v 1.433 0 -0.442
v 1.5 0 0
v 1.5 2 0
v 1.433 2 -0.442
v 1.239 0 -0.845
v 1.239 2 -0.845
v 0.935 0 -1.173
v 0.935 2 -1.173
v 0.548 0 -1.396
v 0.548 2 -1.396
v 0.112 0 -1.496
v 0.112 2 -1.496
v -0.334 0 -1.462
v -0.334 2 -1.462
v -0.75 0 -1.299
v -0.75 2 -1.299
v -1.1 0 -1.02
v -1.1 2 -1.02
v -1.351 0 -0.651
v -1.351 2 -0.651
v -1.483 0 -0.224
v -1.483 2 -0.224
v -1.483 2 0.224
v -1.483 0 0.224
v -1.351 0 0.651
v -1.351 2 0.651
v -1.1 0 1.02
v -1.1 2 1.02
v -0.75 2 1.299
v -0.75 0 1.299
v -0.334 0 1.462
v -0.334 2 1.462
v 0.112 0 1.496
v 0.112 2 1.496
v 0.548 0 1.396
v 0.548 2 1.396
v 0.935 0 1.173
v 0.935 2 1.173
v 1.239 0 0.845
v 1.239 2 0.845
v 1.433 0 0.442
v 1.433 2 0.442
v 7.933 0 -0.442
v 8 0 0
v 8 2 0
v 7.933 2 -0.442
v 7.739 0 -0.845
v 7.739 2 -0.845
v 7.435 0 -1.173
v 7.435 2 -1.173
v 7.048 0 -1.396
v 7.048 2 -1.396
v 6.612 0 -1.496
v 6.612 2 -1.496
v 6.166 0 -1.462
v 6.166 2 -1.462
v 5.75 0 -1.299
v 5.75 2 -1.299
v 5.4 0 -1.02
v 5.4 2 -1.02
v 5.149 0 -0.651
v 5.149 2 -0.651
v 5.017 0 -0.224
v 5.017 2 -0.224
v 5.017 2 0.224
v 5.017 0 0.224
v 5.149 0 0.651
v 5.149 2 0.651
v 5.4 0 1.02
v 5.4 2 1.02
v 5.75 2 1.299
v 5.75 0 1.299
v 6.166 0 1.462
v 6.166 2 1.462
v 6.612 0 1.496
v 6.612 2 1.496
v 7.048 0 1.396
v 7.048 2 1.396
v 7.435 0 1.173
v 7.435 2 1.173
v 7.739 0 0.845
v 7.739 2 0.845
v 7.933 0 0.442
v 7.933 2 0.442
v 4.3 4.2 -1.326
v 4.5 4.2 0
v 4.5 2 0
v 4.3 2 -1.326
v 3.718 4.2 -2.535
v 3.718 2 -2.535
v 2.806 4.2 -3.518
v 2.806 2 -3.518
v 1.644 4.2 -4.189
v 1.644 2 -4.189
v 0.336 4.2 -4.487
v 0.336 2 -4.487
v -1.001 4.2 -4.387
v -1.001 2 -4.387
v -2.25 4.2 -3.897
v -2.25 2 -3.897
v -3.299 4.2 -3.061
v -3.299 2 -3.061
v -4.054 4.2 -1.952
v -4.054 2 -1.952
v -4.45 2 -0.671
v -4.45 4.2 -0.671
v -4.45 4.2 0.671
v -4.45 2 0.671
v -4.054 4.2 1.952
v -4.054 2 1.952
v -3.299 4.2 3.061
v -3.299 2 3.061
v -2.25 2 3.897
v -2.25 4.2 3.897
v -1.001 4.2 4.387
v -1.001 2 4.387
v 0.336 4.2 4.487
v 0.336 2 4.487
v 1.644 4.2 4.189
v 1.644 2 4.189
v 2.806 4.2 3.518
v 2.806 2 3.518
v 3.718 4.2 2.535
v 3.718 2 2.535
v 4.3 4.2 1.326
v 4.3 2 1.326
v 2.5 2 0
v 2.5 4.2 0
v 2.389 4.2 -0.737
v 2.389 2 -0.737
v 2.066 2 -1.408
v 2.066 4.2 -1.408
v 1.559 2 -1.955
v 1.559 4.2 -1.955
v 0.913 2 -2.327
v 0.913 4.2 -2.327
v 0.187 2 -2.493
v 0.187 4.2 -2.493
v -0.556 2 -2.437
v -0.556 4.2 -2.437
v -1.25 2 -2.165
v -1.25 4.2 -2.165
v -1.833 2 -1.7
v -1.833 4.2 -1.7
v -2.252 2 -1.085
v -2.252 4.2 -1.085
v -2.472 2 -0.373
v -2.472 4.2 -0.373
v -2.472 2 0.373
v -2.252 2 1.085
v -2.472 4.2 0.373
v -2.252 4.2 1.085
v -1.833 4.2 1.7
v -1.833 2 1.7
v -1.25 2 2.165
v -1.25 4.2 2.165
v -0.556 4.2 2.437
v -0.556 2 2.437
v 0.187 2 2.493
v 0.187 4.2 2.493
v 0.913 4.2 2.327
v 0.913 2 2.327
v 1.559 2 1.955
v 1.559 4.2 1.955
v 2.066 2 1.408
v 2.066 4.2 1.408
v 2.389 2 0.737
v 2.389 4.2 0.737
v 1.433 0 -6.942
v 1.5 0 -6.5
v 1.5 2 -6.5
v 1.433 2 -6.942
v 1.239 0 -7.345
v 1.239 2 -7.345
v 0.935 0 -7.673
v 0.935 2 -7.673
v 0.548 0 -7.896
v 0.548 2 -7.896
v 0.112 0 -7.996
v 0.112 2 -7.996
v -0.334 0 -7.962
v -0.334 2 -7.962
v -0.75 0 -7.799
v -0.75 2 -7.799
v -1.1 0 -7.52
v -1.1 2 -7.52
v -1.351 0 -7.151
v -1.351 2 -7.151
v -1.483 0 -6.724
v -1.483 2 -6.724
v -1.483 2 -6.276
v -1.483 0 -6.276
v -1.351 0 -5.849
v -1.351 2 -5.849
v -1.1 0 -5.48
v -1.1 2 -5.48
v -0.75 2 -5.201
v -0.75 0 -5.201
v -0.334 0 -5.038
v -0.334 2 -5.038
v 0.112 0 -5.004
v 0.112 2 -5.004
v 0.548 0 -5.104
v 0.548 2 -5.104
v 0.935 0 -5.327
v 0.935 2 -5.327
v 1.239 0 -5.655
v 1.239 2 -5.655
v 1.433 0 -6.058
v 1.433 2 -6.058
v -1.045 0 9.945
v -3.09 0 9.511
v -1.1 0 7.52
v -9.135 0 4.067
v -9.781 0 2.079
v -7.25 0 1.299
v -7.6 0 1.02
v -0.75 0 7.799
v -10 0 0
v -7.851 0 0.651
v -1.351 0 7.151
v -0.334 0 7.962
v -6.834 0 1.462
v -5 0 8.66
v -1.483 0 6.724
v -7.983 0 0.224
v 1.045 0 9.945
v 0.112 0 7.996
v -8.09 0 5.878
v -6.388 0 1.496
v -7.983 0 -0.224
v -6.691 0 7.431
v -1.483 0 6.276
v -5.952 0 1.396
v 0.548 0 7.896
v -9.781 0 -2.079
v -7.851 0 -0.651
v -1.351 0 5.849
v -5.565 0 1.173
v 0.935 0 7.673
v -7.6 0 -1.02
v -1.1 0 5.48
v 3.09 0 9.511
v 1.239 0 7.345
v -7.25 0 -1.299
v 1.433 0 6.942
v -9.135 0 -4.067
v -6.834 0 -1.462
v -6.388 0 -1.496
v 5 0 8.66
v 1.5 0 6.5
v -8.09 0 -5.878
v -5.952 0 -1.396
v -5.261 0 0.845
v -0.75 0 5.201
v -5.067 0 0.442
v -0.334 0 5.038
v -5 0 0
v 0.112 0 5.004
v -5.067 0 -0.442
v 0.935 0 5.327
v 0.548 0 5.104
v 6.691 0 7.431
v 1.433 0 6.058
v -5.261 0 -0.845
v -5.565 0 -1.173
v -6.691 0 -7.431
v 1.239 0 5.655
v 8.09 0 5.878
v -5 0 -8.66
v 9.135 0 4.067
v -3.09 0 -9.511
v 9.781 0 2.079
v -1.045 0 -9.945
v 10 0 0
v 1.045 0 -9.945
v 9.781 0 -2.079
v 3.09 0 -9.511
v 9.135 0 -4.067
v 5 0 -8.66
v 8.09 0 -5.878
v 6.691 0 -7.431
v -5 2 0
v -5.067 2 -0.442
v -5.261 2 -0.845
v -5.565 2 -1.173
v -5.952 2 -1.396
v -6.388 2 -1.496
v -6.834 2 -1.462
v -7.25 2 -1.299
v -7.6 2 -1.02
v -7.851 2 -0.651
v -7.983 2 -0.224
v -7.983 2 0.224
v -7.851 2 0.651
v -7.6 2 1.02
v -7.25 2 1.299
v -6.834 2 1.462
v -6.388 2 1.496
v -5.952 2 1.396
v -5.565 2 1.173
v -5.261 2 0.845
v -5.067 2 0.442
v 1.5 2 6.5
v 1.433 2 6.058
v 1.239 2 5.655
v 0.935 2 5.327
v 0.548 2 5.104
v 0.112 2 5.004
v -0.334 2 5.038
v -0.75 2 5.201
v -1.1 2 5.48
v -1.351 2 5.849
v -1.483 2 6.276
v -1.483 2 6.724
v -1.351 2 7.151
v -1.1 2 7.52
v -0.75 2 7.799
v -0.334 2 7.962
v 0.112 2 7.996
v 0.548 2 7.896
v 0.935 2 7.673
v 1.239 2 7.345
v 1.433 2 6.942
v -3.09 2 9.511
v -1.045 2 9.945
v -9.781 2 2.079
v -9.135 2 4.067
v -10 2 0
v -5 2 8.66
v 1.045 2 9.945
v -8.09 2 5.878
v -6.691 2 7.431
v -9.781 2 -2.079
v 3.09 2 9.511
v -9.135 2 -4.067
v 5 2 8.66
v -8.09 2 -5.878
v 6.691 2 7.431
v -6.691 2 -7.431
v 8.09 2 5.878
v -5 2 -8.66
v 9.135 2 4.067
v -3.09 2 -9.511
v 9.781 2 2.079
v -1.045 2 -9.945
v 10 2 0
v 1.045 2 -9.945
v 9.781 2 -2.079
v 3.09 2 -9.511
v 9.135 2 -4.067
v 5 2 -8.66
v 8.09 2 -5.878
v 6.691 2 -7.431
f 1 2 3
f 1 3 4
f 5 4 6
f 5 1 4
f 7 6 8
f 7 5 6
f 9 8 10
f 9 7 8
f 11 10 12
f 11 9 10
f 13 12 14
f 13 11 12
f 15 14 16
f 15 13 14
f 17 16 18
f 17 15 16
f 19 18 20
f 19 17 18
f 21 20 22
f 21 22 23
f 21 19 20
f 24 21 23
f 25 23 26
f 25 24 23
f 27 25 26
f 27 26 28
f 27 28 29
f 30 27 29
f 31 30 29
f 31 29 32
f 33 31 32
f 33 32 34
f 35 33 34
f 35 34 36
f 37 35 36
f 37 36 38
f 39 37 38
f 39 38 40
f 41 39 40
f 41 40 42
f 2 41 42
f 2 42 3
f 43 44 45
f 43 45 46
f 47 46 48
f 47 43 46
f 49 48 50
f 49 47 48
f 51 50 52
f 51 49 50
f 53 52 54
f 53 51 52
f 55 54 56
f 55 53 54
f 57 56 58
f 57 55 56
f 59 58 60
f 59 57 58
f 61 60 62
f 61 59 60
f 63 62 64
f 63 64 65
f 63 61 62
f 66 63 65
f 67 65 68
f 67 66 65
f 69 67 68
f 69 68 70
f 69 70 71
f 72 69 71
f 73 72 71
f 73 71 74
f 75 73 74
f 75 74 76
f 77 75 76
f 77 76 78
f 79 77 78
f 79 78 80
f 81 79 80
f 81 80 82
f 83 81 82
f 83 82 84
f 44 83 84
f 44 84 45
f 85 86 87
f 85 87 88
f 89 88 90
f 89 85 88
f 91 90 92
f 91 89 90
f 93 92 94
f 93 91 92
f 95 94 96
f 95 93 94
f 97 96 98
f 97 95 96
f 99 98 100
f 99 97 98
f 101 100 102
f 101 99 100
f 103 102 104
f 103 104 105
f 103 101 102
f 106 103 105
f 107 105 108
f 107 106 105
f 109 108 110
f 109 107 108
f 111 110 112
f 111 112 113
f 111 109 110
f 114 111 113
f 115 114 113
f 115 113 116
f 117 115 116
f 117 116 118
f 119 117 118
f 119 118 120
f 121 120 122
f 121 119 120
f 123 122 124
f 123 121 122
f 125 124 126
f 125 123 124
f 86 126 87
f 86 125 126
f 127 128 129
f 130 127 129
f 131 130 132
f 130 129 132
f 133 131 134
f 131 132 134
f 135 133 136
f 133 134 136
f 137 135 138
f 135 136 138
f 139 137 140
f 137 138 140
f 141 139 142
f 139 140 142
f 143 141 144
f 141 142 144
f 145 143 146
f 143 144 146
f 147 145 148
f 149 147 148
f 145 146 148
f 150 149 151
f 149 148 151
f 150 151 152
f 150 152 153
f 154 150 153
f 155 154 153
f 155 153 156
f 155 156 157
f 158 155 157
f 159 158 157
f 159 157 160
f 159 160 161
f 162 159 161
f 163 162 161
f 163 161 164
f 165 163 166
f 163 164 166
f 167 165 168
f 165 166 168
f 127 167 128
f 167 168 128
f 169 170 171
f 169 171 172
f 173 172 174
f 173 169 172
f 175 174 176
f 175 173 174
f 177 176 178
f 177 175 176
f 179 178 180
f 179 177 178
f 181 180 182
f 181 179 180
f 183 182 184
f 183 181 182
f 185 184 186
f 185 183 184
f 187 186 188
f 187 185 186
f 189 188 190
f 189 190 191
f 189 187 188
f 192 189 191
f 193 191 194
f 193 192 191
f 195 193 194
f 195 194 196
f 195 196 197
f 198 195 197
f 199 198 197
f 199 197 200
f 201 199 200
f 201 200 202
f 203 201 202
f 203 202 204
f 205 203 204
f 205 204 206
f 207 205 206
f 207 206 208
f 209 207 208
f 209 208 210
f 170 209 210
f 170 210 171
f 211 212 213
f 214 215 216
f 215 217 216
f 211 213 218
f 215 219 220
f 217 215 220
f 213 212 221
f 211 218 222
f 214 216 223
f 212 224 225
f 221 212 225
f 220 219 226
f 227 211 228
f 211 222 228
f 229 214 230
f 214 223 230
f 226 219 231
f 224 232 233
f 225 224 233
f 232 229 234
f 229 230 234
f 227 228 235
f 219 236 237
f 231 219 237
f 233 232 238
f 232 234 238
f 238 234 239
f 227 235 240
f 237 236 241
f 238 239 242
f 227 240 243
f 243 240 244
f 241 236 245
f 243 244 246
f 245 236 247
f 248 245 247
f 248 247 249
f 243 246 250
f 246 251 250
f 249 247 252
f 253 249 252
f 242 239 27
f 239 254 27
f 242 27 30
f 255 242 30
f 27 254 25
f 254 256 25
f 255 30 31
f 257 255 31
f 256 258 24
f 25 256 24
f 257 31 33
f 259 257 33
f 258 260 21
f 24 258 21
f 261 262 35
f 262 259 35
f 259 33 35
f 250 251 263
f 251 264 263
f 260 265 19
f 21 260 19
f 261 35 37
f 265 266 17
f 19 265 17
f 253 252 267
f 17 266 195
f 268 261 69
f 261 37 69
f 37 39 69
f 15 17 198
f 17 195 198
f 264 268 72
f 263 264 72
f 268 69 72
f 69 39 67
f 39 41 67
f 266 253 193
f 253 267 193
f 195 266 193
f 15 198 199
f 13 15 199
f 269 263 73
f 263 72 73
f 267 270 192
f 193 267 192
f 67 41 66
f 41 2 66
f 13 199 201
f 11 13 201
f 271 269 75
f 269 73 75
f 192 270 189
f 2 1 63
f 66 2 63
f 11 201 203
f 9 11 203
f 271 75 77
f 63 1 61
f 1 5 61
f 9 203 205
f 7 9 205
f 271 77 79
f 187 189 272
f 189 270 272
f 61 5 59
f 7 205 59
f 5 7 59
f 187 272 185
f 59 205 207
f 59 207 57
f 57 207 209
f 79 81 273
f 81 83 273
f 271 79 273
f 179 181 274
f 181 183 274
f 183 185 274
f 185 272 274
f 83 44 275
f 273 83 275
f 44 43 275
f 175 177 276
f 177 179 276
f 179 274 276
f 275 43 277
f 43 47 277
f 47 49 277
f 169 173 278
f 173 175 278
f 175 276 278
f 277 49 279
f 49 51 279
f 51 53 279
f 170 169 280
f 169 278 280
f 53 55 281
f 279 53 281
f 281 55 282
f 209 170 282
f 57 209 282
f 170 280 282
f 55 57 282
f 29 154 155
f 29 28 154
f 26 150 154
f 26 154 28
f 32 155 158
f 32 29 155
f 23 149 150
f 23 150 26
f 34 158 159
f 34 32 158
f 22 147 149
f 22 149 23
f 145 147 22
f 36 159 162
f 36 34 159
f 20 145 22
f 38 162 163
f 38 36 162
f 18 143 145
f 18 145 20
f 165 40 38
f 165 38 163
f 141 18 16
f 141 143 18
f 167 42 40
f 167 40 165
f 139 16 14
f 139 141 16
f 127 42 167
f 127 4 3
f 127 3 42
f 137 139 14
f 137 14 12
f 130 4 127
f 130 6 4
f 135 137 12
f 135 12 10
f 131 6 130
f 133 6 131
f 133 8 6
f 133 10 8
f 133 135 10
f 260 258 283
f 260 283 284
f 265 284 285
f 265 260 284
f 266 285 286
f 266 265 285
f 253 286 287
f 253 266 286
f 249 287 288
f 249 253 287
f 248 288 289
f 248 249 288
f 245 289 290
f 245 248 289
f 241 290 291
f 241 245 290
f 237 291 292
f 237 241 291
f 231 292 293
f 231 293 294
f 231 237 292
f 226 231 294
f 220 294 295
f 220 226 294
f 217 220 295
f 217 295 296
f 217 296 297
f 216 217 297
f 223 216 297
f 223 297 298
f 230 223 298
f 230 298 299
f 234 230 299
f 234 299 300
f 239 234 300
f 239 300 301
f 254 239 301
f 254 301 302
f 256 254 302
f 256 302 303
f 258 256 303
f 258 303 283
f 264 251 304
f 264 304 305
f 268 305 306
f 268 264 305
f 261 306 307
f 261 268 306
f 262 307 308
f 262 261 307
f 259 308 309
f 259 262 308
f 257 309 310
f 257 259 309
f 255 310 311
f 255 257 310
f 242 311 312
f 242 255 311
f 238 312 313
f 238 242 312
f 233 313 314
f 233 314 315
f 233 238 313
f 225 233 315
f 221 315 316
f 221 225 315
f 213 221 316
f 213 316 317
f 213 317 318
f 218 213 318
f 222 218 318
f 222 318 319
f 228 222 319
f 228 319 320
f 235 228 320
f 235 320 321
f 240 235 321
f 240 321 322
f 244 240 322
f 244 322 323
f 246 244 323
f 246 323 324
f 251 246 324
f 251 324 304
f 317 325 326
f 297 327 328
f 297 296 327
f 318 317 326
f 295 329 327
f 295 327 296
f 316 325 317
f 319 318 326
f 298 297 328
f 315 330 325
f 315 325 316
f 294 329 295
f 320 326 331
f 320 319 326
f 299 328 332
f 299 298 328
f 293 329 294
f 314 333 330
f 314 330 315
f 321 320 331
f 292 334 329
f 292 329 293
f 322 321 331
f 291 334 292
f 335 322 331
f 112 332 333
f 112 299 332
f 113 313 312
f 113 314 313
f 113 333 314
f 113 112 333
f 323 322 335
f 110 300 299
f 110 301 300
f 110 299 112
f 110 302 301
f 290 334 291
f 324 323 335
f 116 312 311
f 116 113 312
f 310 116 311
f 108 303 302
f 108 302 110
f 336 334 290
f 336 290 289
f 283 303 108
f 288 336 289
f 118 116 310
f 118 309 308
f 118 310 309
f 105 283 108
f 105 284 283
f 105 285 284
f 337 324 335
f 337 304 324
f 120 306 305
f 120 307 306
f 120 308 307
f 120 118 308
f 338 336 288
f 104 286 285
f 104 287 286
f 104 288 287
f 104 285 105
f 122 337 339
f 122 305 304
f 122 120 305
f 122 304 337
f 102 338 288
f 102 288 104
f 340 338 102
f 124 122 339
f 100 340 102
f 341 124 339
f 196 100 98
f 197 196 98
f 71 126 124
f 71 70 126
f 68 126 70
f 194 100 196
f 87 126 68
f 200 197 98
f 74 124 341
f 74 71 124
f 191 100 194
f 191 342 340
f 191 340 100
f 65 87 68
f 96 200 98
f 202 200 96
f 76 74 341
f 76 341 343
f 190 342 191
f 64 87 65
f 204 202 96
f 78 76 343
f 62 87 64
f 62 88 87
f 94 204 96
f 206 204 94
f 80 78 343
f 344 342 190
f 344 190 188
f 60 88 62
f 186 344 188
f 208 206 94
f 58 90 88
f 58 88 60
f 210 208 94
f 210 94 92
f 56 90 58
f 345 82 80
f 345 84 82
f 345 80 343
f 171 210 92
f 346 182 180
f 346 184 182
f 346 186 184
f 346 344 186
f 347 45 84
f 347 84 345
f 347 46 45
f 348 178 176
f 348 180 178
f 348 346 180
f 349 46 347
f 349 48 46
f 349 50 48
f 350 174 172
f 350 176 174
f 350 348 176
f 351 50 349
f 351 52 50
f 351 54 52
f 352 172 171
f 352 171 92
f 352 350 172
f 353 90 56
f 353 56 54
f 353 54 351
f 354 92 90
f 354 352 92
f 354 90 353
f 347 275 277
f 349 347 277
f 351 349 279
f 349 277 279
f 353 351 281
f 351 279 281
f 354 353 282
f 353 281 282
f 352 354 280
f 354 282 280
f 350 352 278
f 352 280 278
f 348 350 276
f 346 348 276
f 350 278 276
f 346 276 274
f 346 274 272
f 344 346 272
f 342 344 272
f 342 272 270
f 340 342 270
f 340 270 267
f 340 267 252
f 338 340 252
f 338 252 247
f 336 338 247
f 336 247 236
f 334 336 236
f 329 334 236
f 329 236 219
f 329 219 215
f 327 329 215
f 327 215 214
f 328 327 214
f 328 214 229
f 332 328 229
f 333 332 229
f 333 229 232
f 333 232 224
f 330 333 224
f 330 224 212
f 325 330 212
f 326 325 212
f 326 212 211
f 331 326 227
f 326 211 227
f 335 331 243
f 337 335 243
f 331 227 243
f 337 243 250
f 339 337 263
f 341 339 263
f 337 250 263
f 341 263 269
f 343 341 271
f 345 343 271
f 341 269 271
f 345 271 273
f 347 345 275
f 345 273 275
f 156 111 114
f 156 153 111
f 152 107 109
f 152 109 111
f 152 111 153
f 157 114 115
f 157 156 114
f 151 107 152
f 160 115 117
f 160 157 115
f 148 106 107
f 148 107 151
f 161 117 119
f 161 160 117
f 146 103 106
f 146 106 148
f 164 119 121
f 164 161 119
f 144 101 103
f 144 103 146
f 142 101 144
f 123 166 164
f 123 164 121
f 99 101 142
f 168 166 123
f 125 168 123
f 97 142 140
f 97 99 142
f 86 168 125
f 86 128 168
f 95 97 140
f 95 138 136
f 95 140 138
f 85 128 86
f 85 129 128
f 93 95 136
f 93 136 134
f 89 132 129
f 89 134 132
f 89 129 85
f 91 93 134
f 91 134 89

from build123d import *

# Parameters (mm, degrees)
SKETCH_1_R          = 10
SKETCH_1_R_2        = 1.5
EXTRUDE_1_DEPTH     = 4.2
SKETCH_2_R          = 10
SKETCH_2_R_2        = 4.5
SKETCH_2_R_3        = 1.5
SKETCH_2_R_4        = 2.5
CUT_EXTRUDE_1_DEPTH = 2.2


with BuildPart() as part:
    # 草图1 → 凸台-拉伸1 (new body)
    with BuildSketch(Plane(origin=(0, 0, 0), x_dir=(1, 0, 0), z_dir=(0, 1, 0))):
        Circle(SKETCH_1_R)
        with Locations((0, 6.5)):
            Circle(SKETCH_1_R_2, mode=Mode.SUBTRACT)
        with Locations((0, -6.5)):
            Circle(SKETCH_1_R_2, mode=Mode.SUBTRACT)
        with Locations((6.5, 0)):
            Circle(SKETCH_1_R_2, mode=Mode.SUBTRACT)
        with Locations((-6.5, 0)):
            Circle(SKETCH_1_R_2, mode=Mode.SUBTRACT)
        Circle(SKETCH_1_R_2, mode=Mode.SUBTRACT)
    extrude(amount=EXTRUDE_1_DEPTH)

    # 草图2 → 切除-拉伸1 (cut)
    with BuildSketch(Plane(origin=(0, 4.2, 0), x_dir=(1, 0, 0), z_dir=(0, 1, 0))):
        Circle(SKETCH_2_R)
        Circle(SKETCH_2_R_2, mode=Mode.SUBTRACT)
        with Locations((0, 6.5)):
            Circle(SKETCH_2_R_3, mode=Mode.SUBTRACT)
        with Locations((-6.5, 0)):
            Circle(SKETCH_2_R_3, mode=Mode.SUBTRACT)
        with Locations((0, -6.5)):
            Circle(SKETCH_2_R_3, mode=Mode.SUBTRACT)
        with Locations((6.5, 0)):
            Circle(SKETCH_2_R_3, mode=Mode.SUBTRACT)
        Circle(SKETCH_2_R_4)
        Circle(SKETCH_2_R_3, mode=Mode.SUBTRACT)
    extrude(amount=-CUT_EXTRUDE_1_DEPTH, mode=Mode.SUBTRACT)


solid = part.part
